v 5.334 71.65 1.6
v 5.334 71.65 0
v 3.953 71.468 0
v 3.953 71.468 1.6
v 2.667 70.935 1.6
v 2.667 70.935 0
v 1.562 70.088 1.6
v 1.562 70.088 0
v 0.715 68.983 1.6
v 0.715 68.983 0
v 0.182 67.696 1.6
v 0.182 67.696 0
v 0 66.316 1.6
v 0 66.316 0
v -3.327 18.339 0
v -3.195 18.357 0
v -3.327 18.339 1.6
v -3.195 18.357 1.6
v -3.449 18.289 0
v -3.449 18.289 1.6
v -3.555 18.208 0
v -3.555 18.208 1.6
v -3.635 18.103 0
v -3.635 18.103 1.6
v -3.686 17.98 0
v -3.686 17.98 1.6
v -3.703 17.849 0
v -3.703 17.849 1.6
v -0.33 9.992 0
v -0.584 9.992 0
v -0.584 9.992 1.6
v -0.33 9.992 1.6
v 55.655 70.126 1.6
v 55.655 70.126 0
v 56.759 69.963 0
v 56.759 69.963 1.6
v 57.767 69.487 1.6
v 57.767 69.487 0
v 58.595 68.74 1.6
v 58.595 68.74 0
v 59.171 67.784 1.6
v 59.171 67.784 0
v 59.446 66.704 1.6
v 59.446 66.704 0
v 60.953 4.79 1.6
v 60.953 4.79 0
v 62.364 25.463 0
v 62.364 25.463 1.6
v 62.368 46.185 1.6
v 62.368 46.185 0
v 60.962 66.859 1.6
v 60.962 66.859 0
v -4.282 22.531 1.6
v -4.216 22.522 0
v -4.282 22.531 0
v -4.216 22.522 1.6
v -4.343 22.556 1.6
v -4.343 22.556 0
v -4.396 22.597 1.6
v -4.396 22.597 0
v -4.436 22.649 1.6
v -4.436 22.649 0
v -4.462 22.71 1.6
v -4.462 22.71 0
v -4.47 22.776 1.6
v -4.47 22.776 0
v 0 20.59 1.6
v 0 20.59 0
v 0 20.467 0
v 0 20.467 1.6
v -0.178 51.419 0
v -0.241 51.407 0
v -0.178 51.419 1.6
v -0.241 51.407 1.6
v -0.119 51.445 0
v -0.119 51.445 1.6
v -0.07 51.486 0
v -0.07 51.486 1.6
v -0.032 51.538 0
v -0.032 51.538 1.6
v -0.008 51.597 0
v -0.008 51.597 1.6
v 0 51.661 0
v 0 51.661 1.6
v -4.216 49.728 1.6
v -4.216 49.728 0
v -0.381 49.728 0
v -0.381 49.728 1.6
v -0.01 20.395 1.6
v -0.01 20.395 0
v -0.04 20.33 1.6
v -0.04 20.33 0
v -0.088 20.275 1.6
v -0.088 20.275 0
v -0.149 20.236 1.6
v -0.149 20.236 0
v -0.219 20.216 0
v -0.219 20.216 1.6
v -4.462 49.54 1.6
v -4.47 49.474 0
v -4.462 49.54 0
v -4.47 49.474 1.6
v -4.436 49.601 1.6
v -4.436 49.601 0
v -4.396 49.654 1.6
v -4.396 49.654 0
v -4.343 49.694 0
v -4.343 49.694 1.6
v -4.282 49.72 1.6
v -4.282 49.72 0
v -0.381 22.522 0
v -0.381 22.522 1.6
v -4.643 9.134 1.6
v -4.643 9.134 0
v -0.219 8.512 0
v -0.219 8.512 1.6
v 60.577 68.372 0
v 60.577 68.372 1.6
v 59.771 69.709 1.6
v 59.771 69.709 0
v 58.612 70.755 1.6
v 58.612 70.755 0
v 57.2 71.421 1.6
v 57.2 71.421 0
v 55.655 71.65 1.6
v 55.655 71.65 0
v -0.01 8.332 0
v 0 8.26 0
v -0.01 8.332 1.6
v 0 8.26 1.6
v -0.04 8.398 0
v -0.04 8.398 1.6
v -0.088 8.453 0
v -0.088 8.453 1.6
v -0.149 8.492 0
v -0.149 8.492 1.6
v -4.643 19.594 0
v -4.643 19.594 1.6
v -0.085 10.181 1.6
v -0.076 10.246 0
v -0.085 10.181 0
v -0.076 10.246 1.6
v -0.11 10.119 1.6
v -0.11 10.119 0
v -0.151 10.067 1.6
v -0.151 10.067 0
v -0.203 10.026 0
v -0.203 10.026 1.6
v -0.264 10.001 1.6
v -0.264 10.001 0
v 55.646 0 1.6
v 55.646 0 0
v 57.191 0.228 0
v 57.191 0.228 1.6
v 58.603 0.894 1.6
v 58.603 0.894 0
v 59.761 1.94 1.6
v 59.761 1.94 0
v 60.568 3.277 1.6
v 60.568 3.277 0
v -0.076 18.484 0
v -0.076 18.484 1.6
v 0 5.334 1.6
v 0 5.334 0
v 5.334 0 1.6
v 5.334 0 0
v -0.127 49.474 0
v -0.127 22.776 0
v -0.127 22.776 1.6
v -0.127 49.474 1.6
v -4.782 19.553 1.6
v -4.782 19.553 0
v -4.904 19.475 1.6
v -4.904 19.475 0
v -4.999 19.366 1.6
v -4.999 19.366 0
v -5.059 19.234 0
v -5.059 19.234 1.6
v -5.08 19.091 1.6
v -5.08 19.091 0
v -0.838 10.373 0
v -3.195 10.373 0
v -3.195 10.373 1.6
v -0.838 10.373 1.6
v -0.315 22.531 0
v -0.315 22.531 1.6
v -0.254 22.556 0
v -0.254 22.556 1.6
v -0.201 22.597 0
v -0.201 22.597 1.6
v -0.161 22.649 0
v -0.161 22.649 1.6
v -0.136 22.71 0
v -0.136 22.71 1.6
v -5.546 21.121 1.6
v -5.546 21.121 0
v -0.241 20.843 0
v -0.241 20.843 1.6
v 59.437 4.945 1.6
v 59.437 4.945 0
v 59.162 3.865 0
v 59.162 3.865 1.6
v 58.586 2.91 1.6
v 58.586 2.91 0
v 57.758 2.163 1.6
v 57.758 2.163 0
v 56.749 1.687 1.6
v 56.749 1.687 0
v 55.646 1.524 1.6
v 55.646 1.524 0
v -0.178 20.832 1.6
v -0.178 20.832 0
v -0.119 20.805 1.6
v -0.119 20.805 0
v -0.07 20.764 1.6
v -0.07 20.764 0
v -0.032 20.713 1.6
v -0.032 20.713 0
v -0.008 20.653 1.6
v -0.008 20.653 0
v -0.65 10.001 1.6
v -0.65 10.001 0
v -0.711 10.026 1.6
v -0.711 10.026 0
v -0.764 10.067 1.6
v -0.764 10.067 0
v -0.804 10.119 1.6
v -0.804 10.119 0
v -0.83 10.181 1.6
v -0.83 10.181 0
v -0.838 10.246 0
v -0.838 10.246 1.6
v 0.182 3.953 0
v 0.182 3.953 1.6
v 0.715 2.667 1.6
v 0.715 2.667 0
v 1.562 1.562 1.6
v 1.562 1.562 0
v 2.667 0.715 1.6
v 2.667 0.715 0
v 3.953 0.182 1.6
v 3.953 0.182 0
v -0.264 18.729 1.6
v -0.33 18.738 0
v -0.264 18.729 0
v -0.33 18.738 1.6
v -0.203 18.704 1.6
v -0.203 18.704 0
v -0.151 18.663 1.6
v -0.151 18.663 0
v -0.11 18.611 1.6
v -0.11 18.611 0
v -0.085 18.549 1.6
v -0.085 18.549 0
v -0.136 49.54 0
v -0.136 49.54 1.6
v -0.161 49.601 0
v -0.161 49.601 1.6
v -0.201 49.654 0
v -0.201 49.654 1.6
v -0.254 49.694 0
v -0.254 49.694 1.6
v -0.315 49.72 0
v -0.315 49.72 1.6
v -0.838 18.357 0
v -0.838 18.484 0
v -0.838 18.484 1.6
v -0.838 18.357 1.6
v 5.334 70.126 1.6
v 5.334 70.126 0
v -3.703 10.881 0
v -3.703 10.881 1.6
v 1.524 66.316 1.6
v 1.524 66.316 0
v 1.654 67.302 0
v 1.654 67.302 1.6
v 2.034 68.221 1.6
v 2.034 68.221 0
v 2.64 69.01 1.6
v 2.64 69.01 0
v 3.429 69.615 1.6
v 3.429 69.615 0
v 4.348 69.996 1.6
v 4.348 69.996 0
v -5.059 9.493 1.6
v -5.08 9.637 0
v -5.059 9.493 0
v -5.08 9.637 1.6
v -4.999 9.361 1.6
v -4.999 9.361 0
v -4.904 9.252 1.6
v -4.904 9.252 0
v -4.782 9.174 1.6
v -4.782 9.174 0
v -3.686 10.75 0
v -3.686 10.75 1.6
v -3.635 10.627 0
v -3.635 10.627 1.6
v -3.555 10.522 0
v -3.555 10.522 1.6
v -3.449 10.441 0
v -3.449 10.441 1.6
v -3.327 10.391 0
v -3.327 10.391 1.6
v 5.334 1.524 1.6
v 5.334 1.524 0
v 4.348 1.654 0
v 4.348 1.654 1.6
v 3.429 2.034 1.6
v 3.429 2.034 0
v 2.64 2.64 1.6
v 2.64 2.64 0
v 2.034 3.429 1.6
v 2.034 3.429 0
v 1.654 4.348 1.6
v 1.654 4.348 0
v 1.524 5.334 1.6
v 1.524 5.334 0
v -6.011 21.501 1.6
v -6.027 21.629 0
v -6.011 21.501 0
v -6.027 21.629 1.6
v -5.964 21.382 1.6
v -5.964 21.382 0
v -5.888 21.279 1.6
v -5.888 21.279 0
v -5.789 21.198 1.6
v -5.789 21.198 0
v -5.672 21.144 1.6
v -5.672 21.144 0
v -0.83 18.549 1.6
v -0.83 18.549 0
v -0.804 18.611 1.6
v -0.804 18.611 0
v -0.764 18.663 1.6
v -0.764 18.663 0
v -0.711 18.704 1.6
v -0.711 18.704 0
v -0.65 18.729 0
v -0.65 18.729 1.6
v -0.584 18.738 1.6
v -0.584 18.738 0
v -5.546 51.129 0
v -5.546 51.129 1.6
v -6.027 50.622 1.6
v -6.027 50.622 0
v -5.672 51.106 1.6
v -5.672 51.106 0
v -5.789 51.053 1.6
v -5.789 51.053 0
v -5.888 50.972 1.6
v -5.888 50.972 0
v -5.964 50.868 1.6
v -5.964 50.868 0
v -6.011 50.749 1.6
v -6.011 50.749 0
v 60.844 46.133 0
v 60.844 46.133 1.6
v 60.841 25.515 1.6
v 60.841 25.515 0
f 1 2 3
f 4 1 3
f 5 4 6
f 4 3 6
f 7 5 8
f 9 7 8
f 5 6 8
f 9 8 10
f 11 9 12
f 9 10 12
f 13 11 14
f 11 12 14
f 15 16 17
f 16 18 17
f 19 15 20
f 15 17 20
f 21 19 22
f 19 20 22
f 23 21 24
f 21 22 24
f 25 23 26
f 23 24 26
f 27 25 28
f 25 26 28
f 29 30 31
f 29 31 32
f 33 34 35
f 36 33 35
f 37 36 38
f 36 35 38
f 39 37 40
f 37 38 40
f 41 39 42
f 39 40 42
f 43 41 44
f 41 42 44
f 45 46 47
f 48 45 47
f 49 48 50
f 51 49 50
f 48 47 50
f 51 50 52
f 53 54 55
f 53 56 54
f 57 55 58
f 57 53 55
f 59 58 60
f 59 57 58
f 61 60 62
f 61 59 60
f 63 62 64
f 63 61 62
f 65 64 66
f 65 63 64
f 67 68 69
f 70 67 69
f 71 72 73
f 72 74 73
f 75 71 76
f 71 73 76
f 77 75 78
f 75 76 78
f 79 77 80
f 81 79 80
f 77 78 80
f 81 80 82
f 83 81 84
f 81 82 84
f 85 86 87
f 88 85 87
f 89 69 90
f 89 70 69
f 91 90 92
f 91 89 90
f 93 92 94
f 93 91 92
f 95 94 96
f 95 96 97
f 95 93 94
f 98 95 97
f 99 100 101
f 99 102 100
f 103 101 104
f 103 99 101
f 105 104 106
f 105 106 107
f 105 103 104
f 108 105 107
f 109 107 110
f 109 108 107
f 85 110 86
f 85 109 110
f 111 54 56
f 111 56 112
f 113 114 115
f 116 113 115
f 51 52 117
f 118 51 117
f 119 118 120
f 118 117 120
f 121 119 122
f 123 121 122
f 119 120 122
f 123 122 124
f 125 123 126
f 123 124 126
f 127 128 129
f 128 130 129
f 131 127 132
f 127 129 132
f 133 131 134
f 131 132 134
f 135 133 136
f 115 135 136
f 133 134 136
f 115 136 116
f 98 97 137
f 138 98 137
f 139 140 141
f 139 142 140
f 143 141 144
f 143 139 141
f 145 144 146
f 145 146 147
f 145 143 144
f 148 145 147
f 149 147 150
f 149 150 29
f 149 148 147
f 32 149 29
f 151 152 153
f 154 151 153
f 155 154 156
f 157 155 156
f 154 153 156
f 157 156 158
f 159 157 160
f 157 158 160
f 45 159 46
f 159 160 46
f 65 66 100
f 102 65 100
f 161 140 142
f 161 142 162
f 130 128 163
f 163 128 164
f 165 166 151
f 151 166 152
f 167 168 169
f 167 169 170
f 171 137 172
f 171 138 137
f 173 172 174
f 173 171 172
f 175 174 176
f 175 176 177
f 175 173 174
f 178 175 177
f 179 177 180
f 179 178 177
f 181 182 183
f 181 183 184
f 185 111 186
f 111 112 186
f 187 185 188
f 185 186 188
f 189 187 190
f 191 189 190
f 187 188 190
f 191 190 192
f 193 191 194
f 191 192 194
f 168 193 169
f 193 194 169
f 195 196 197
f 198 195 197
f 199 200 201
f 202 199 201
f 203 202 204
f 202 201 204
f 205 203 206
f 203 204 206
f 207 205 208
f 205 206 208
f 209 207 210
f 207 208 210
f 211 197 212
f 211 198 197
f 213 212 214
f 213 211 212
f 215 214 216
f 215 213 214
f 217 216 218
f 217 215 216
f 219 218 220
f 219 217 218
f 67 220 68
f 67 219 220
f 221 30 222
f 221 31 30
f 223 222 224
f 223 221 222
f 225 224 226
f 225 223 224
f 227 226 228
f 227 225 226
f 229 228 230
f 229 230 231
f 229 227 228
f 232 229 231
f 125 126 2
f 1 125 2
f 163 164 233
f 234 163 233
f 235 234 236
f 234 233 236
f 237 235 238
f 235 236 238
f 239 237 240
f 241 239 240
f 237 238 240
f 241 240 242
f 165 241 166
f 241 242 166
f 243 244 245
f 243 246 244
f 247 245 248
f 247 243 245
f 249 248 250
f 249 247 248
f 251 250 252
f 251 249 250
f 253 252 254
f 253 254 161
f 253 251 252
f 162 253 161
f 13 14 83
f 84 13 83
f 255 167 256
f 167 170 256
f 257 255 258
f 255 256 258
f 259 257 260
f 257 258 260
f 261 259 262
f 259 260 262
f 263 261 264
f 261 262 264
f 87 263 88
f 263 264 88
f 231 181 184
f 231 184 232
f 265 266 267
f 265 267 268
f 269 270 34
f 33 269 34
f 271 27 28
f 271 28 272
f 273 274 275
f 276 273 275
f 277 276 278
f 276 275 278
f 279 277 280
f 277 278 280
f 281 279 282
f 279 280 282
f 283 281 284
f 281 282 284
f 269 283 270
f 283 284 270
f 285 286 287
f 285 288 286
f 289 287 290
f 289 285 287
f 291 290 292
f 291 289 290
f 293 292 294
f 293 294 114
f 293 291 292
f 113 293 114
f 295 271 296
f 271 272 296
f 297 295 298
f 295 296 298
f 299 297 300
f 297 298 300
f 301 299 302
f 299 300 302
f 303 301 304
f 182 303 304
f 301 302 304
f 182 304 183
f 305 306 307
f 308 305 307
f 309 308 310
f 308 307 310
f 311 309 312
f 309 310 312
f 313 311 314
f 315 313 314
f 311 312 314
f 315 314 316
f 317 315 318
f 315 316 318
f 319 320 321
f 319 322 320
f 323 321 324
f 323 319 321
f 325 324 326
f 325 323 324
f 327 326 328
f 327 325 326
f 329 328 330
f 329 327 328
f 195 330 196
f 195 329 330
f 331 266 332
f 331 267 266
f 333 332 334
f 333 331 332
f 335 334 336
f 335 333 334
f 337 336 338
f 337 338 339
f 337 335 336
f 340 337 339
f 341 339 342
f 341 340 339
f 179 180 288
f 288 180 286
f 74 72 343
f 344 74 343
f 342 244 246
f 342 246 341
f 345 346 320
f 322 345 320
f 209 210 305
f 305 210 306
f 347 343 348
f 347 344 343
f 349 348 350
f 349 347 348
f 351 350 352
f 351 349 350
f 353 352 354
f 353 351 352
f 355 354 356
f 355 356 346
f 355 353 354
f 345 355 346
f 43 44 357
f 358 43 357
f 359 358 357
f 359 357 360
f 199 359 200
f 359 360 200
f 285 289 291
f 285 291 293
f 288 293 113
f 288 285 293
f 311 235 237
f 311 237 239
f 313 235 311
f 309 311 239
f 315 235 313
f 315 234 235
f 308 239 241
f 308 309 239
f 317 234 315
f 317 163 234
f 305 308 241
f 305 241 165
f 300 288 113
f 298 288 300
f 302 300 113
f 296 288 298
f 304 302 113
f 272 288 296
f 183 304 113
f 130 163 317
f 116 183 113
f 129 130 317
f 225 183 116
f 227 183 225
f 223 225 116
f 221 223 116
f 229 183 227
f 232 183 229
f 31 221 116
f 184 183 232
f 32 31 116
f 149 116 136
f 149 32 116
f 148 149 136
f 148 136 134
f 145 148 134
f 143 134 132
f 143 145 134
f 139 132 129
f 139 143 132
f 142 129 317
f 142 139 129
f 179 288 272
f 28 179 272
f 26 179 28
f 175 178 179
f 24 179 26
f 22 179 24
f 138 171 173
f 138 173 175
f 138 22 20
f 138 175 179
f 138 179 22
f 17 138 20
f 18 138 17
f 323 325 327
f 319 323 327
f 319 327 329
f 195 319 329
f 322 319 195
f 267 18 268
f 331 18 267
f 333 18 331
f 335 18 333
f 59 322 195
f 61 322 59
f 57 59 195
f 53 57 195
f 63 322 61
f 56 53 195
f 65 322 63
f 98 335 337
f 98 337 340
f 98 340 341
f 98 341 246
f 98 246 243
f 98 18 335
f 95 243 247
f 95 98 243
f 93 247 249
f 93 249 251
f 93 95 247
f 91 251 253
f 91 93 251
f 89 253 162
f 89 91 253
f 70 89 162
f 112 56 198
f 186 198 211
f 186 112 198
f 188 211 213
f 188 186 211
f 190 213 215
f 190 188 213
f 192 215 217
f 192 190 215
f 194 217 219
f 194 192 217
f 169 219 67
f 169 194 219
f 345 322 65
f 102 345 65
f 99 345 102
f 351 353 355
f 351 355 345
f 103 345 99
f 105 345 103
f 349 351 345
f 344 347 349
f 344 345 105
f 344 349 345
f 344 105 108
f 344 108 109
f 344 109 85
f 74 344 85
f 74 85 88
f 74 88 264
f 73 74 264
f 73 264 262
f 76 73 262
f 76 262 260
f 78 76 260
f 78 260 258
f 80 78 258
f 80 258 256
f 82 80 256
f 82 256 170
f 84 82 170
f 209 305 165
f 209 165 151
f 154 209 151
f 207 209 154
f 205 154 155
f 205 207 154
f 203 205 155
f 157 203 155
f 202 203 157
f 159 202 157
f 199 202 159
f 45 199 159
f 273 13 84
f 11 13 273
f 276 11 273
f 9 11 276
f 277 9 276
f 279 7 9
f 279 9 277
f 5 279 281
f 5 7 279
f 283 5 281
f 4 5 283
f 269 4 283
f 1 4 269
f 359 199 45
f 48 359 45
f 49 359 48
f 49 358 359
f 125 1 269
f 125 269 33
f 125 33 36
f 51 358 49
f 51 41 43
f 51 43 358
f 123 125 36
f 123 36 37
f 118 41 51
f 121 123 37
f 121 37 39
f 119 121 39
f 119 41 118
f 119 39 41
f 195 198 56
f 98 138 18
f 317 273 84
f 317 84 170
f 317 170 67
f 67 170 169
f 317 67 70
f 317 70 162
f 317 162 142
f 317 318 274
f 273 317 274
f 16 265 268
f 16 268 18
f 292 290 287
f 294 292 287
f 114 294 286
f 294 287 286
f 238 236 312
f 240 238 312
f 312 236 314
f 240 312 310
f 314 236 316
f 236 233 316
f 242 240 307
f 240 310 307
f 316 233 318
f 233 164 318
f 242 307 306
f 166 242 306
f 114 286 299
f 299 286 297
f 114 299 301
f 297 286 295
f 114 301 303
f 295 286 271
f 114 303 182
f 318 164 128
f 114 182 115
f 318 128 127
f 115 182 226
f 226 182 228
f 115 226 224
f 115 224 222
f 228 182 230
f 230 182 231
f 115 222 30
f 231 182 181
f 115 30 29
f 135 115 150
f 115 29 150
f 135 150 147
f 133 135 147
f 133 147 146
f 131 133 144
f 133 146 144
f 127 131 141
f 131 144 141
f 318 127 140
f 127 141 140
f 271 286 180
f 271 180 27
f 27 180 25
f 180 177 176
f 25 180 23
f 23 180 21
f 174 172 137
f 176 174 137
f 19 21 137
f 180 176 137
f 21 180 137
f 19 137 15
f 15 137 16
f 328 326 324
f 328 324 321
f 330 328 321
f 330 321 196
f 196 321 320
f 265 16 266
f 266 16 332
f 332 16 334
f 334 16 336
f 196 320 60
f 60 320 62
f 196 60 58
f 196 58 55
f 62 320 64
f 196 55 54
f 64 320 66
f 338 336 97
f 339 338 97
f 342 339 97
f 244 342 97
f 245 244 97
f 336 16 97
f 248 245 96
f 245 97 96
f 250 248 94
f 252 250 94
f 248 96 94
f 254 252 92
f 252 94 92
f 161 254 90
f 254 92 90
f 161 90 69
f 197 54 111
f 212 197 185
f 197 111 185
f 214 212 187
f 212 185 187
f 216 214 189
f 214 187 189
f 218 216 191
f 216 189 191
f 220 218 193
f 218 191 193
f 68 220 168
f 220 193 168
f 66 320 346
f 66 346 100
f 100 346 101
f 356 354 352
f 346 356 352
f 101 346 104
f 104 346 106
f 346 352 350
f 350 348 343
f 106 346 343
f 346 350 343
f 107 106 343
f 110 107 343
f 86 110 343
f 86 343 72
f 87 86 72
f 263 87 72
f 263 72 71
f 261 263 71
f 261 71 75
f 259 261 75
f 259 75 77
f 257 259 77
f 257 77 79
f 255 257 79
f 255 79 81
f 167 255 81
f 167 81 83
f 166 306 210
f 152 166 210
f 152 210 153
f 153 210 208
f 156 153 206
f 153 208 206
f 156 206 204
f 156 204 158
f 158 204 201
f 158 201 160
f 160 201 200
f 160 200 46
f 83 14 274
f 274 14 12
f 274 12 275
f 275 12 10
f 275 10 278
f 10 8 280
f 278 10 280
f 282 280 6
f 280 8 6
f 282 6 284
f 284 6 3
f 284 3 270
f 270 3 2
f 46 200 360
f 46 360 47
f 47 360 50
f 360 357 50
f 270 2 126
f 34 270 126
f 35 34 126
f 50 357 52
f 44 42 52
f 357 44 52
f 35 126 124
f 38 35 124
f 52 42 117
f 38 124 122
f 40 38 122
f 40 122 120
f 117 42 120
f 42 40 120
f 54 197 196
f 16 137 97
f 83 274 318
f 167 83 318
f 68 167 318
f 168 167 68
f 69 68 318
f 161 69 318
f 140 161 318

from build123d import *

# Parameters (mm, degrees)
SKETCH1_W           = 4.3434
SKETCH1_H           = 27.20594
BOSS_EXTRUDE1_DEPTH = 1.6002
FILLET1_R           = 0.508
FILLET2_R           = 0.508
FILLET3_R           = 0.254


with BuildPart() as part:
    # Sketch1 → Boss-Extrude1 (new body)
    with BuildSketch(Plane.XY):
        with BuildLine():
            Line((0, 51.4198), (-6.02742, 51.103916303))
            Line((-6.02742, 51.103916303), (-6.02742, 21.146463697))
            Line((-6.02742, 21.146463697), (0, 20.83058))
            Line((0, 20.83058), (0, 20.24638))
            Line((0, 20.24638), (-5.08, 19.53243256))
            Line((-5.08, 19.53243256), (-5.08, 9.19504744))
            Line((-5.08, 9.19504744), (0, 8.4811))
            Line((0, 8.4811), (0, 5.334))
            ThreePointArc((0, 5.334), (1.562292429, 1.562292429), (5.334, 0))
            Line((5.334, 0), (55.64639368, 0))
            ThreePointArc((55.64639368, 0), (59.220505665, 1.374545553), (60.952555507, 4.789754962))
            ThreePointArc((60.952555507, 4.789754962), (62.542276693, 35.823920719), (60.961816866, 66.858559503))
            ThreePointArc((60.961816866, 66.858559503), (59.230195601, 70.274819072), (55.65549286, 71.649897966))
            Line((55.65549286, 71.649897966), (5.334, 71.649897966))
            ThreePointArc((5.334, 71.649897966), (1.562292429, 70.087605537), (0, 66.315897966))
            Line((0, 66.315897966), (0, 51.4198))
        make_face()
        with BuildLine():
            Line((5.334, 70.125897966), (55.65549286, 70.125897966))
            ThreePointArc((55.65549286, 70.125897966), (58.208851961, 69.143698756), (59.445724293, 66.70351335))
            ThreePointArc((59.445724293, 66.70351335), (61.01827671, 35.824148117), (59.436509271, 4.945253544))
            ThreePointArc((59.436509271, 4.945253544), (58.199330812, 2.505818252), (55.64639368, 1.524))
            Line((55.64639368, 1.524), (5.334, 1.524))
            ThreePointArc((5.334, 1.524), (2.639923164, 2.639923164), (1.524, 5.334))
            Line((1.524, 5.334), (1.524, 66.315897966))
            ThreePointArc((1.524, 66.315897966), (2.639923164, 69.009974802), (5.334, 70.125897966))
        make_face(mode=Mode.SUBTRACT)
        with Locations((-2.2987, 36.12519)):
            Rectangle(SKETCH1_W, SKETCH1_H, mode=Mode.SUBTRACT)
        Polygon((-0.8382, 18.35662), (-3.70332, 18.35662), (-3.70332, 10.3734), (-0.8382, 10.3734), (-0.8382, 9.9924), (-0.0762, 9.9924), (-0.0762, 18.73762), (-0.8382, 18.73762), align=None, mode=Mode.SUBTRACT)
    extrude(amount=BOSS_EXTRUDE1_DEPTH)

    # Fillet1
    fillet1_edges = [part.edges().sort_by_distance(p)[0] for p in [
        (-3.70332, 18.35662, 0.8001),
        (-3.70332, 10.3734, 0.8001),
    ]]
    fillet(fillet1_edges, radius=FILLET1_R)

    # Fillet2
    fillet2_edges = [part.edges().sort_by_distance(p)[0] for p in [
        (-5.08, 9.19504744, 0.8001),
        (-5.08, 19.53243256, 0.8001),
        (-6.02742, 21.146463697, 0.8001),
        (-6.02742, 51.103916303, 0.8001),
    ]]
    fillet(fillet2_edges, radius=FILLET2_R)

    # Fillet3
    fillet3_edges = [part.edges().sort_by_distance(p)[0] for p in [
        (0, 8.4811, 0.8001),
        (0, 20.24638, 0.8001),
        (0, 20.83058, 0.8001),
        (0, 51.4198, 0.8001),
        (-0.127, 22.52222, 0.8001),
        (-0.127, 49.72816, 0.8001),
        (-4.4704, 49.72816, 0.8001),
        (-4.4704, 22.52222, 0.8001),
        (-0.8382, 9.9924, 0.8001),
        (-0.0762, 9.9924, 0.8001),
        (-0.0762, 18.73762, 0.8001),
        (-0.8382, 18.73762, 0.8001),
    ]]
    fillet(fillet3_edges, radius=FILLET3_R)


solid = part.part
